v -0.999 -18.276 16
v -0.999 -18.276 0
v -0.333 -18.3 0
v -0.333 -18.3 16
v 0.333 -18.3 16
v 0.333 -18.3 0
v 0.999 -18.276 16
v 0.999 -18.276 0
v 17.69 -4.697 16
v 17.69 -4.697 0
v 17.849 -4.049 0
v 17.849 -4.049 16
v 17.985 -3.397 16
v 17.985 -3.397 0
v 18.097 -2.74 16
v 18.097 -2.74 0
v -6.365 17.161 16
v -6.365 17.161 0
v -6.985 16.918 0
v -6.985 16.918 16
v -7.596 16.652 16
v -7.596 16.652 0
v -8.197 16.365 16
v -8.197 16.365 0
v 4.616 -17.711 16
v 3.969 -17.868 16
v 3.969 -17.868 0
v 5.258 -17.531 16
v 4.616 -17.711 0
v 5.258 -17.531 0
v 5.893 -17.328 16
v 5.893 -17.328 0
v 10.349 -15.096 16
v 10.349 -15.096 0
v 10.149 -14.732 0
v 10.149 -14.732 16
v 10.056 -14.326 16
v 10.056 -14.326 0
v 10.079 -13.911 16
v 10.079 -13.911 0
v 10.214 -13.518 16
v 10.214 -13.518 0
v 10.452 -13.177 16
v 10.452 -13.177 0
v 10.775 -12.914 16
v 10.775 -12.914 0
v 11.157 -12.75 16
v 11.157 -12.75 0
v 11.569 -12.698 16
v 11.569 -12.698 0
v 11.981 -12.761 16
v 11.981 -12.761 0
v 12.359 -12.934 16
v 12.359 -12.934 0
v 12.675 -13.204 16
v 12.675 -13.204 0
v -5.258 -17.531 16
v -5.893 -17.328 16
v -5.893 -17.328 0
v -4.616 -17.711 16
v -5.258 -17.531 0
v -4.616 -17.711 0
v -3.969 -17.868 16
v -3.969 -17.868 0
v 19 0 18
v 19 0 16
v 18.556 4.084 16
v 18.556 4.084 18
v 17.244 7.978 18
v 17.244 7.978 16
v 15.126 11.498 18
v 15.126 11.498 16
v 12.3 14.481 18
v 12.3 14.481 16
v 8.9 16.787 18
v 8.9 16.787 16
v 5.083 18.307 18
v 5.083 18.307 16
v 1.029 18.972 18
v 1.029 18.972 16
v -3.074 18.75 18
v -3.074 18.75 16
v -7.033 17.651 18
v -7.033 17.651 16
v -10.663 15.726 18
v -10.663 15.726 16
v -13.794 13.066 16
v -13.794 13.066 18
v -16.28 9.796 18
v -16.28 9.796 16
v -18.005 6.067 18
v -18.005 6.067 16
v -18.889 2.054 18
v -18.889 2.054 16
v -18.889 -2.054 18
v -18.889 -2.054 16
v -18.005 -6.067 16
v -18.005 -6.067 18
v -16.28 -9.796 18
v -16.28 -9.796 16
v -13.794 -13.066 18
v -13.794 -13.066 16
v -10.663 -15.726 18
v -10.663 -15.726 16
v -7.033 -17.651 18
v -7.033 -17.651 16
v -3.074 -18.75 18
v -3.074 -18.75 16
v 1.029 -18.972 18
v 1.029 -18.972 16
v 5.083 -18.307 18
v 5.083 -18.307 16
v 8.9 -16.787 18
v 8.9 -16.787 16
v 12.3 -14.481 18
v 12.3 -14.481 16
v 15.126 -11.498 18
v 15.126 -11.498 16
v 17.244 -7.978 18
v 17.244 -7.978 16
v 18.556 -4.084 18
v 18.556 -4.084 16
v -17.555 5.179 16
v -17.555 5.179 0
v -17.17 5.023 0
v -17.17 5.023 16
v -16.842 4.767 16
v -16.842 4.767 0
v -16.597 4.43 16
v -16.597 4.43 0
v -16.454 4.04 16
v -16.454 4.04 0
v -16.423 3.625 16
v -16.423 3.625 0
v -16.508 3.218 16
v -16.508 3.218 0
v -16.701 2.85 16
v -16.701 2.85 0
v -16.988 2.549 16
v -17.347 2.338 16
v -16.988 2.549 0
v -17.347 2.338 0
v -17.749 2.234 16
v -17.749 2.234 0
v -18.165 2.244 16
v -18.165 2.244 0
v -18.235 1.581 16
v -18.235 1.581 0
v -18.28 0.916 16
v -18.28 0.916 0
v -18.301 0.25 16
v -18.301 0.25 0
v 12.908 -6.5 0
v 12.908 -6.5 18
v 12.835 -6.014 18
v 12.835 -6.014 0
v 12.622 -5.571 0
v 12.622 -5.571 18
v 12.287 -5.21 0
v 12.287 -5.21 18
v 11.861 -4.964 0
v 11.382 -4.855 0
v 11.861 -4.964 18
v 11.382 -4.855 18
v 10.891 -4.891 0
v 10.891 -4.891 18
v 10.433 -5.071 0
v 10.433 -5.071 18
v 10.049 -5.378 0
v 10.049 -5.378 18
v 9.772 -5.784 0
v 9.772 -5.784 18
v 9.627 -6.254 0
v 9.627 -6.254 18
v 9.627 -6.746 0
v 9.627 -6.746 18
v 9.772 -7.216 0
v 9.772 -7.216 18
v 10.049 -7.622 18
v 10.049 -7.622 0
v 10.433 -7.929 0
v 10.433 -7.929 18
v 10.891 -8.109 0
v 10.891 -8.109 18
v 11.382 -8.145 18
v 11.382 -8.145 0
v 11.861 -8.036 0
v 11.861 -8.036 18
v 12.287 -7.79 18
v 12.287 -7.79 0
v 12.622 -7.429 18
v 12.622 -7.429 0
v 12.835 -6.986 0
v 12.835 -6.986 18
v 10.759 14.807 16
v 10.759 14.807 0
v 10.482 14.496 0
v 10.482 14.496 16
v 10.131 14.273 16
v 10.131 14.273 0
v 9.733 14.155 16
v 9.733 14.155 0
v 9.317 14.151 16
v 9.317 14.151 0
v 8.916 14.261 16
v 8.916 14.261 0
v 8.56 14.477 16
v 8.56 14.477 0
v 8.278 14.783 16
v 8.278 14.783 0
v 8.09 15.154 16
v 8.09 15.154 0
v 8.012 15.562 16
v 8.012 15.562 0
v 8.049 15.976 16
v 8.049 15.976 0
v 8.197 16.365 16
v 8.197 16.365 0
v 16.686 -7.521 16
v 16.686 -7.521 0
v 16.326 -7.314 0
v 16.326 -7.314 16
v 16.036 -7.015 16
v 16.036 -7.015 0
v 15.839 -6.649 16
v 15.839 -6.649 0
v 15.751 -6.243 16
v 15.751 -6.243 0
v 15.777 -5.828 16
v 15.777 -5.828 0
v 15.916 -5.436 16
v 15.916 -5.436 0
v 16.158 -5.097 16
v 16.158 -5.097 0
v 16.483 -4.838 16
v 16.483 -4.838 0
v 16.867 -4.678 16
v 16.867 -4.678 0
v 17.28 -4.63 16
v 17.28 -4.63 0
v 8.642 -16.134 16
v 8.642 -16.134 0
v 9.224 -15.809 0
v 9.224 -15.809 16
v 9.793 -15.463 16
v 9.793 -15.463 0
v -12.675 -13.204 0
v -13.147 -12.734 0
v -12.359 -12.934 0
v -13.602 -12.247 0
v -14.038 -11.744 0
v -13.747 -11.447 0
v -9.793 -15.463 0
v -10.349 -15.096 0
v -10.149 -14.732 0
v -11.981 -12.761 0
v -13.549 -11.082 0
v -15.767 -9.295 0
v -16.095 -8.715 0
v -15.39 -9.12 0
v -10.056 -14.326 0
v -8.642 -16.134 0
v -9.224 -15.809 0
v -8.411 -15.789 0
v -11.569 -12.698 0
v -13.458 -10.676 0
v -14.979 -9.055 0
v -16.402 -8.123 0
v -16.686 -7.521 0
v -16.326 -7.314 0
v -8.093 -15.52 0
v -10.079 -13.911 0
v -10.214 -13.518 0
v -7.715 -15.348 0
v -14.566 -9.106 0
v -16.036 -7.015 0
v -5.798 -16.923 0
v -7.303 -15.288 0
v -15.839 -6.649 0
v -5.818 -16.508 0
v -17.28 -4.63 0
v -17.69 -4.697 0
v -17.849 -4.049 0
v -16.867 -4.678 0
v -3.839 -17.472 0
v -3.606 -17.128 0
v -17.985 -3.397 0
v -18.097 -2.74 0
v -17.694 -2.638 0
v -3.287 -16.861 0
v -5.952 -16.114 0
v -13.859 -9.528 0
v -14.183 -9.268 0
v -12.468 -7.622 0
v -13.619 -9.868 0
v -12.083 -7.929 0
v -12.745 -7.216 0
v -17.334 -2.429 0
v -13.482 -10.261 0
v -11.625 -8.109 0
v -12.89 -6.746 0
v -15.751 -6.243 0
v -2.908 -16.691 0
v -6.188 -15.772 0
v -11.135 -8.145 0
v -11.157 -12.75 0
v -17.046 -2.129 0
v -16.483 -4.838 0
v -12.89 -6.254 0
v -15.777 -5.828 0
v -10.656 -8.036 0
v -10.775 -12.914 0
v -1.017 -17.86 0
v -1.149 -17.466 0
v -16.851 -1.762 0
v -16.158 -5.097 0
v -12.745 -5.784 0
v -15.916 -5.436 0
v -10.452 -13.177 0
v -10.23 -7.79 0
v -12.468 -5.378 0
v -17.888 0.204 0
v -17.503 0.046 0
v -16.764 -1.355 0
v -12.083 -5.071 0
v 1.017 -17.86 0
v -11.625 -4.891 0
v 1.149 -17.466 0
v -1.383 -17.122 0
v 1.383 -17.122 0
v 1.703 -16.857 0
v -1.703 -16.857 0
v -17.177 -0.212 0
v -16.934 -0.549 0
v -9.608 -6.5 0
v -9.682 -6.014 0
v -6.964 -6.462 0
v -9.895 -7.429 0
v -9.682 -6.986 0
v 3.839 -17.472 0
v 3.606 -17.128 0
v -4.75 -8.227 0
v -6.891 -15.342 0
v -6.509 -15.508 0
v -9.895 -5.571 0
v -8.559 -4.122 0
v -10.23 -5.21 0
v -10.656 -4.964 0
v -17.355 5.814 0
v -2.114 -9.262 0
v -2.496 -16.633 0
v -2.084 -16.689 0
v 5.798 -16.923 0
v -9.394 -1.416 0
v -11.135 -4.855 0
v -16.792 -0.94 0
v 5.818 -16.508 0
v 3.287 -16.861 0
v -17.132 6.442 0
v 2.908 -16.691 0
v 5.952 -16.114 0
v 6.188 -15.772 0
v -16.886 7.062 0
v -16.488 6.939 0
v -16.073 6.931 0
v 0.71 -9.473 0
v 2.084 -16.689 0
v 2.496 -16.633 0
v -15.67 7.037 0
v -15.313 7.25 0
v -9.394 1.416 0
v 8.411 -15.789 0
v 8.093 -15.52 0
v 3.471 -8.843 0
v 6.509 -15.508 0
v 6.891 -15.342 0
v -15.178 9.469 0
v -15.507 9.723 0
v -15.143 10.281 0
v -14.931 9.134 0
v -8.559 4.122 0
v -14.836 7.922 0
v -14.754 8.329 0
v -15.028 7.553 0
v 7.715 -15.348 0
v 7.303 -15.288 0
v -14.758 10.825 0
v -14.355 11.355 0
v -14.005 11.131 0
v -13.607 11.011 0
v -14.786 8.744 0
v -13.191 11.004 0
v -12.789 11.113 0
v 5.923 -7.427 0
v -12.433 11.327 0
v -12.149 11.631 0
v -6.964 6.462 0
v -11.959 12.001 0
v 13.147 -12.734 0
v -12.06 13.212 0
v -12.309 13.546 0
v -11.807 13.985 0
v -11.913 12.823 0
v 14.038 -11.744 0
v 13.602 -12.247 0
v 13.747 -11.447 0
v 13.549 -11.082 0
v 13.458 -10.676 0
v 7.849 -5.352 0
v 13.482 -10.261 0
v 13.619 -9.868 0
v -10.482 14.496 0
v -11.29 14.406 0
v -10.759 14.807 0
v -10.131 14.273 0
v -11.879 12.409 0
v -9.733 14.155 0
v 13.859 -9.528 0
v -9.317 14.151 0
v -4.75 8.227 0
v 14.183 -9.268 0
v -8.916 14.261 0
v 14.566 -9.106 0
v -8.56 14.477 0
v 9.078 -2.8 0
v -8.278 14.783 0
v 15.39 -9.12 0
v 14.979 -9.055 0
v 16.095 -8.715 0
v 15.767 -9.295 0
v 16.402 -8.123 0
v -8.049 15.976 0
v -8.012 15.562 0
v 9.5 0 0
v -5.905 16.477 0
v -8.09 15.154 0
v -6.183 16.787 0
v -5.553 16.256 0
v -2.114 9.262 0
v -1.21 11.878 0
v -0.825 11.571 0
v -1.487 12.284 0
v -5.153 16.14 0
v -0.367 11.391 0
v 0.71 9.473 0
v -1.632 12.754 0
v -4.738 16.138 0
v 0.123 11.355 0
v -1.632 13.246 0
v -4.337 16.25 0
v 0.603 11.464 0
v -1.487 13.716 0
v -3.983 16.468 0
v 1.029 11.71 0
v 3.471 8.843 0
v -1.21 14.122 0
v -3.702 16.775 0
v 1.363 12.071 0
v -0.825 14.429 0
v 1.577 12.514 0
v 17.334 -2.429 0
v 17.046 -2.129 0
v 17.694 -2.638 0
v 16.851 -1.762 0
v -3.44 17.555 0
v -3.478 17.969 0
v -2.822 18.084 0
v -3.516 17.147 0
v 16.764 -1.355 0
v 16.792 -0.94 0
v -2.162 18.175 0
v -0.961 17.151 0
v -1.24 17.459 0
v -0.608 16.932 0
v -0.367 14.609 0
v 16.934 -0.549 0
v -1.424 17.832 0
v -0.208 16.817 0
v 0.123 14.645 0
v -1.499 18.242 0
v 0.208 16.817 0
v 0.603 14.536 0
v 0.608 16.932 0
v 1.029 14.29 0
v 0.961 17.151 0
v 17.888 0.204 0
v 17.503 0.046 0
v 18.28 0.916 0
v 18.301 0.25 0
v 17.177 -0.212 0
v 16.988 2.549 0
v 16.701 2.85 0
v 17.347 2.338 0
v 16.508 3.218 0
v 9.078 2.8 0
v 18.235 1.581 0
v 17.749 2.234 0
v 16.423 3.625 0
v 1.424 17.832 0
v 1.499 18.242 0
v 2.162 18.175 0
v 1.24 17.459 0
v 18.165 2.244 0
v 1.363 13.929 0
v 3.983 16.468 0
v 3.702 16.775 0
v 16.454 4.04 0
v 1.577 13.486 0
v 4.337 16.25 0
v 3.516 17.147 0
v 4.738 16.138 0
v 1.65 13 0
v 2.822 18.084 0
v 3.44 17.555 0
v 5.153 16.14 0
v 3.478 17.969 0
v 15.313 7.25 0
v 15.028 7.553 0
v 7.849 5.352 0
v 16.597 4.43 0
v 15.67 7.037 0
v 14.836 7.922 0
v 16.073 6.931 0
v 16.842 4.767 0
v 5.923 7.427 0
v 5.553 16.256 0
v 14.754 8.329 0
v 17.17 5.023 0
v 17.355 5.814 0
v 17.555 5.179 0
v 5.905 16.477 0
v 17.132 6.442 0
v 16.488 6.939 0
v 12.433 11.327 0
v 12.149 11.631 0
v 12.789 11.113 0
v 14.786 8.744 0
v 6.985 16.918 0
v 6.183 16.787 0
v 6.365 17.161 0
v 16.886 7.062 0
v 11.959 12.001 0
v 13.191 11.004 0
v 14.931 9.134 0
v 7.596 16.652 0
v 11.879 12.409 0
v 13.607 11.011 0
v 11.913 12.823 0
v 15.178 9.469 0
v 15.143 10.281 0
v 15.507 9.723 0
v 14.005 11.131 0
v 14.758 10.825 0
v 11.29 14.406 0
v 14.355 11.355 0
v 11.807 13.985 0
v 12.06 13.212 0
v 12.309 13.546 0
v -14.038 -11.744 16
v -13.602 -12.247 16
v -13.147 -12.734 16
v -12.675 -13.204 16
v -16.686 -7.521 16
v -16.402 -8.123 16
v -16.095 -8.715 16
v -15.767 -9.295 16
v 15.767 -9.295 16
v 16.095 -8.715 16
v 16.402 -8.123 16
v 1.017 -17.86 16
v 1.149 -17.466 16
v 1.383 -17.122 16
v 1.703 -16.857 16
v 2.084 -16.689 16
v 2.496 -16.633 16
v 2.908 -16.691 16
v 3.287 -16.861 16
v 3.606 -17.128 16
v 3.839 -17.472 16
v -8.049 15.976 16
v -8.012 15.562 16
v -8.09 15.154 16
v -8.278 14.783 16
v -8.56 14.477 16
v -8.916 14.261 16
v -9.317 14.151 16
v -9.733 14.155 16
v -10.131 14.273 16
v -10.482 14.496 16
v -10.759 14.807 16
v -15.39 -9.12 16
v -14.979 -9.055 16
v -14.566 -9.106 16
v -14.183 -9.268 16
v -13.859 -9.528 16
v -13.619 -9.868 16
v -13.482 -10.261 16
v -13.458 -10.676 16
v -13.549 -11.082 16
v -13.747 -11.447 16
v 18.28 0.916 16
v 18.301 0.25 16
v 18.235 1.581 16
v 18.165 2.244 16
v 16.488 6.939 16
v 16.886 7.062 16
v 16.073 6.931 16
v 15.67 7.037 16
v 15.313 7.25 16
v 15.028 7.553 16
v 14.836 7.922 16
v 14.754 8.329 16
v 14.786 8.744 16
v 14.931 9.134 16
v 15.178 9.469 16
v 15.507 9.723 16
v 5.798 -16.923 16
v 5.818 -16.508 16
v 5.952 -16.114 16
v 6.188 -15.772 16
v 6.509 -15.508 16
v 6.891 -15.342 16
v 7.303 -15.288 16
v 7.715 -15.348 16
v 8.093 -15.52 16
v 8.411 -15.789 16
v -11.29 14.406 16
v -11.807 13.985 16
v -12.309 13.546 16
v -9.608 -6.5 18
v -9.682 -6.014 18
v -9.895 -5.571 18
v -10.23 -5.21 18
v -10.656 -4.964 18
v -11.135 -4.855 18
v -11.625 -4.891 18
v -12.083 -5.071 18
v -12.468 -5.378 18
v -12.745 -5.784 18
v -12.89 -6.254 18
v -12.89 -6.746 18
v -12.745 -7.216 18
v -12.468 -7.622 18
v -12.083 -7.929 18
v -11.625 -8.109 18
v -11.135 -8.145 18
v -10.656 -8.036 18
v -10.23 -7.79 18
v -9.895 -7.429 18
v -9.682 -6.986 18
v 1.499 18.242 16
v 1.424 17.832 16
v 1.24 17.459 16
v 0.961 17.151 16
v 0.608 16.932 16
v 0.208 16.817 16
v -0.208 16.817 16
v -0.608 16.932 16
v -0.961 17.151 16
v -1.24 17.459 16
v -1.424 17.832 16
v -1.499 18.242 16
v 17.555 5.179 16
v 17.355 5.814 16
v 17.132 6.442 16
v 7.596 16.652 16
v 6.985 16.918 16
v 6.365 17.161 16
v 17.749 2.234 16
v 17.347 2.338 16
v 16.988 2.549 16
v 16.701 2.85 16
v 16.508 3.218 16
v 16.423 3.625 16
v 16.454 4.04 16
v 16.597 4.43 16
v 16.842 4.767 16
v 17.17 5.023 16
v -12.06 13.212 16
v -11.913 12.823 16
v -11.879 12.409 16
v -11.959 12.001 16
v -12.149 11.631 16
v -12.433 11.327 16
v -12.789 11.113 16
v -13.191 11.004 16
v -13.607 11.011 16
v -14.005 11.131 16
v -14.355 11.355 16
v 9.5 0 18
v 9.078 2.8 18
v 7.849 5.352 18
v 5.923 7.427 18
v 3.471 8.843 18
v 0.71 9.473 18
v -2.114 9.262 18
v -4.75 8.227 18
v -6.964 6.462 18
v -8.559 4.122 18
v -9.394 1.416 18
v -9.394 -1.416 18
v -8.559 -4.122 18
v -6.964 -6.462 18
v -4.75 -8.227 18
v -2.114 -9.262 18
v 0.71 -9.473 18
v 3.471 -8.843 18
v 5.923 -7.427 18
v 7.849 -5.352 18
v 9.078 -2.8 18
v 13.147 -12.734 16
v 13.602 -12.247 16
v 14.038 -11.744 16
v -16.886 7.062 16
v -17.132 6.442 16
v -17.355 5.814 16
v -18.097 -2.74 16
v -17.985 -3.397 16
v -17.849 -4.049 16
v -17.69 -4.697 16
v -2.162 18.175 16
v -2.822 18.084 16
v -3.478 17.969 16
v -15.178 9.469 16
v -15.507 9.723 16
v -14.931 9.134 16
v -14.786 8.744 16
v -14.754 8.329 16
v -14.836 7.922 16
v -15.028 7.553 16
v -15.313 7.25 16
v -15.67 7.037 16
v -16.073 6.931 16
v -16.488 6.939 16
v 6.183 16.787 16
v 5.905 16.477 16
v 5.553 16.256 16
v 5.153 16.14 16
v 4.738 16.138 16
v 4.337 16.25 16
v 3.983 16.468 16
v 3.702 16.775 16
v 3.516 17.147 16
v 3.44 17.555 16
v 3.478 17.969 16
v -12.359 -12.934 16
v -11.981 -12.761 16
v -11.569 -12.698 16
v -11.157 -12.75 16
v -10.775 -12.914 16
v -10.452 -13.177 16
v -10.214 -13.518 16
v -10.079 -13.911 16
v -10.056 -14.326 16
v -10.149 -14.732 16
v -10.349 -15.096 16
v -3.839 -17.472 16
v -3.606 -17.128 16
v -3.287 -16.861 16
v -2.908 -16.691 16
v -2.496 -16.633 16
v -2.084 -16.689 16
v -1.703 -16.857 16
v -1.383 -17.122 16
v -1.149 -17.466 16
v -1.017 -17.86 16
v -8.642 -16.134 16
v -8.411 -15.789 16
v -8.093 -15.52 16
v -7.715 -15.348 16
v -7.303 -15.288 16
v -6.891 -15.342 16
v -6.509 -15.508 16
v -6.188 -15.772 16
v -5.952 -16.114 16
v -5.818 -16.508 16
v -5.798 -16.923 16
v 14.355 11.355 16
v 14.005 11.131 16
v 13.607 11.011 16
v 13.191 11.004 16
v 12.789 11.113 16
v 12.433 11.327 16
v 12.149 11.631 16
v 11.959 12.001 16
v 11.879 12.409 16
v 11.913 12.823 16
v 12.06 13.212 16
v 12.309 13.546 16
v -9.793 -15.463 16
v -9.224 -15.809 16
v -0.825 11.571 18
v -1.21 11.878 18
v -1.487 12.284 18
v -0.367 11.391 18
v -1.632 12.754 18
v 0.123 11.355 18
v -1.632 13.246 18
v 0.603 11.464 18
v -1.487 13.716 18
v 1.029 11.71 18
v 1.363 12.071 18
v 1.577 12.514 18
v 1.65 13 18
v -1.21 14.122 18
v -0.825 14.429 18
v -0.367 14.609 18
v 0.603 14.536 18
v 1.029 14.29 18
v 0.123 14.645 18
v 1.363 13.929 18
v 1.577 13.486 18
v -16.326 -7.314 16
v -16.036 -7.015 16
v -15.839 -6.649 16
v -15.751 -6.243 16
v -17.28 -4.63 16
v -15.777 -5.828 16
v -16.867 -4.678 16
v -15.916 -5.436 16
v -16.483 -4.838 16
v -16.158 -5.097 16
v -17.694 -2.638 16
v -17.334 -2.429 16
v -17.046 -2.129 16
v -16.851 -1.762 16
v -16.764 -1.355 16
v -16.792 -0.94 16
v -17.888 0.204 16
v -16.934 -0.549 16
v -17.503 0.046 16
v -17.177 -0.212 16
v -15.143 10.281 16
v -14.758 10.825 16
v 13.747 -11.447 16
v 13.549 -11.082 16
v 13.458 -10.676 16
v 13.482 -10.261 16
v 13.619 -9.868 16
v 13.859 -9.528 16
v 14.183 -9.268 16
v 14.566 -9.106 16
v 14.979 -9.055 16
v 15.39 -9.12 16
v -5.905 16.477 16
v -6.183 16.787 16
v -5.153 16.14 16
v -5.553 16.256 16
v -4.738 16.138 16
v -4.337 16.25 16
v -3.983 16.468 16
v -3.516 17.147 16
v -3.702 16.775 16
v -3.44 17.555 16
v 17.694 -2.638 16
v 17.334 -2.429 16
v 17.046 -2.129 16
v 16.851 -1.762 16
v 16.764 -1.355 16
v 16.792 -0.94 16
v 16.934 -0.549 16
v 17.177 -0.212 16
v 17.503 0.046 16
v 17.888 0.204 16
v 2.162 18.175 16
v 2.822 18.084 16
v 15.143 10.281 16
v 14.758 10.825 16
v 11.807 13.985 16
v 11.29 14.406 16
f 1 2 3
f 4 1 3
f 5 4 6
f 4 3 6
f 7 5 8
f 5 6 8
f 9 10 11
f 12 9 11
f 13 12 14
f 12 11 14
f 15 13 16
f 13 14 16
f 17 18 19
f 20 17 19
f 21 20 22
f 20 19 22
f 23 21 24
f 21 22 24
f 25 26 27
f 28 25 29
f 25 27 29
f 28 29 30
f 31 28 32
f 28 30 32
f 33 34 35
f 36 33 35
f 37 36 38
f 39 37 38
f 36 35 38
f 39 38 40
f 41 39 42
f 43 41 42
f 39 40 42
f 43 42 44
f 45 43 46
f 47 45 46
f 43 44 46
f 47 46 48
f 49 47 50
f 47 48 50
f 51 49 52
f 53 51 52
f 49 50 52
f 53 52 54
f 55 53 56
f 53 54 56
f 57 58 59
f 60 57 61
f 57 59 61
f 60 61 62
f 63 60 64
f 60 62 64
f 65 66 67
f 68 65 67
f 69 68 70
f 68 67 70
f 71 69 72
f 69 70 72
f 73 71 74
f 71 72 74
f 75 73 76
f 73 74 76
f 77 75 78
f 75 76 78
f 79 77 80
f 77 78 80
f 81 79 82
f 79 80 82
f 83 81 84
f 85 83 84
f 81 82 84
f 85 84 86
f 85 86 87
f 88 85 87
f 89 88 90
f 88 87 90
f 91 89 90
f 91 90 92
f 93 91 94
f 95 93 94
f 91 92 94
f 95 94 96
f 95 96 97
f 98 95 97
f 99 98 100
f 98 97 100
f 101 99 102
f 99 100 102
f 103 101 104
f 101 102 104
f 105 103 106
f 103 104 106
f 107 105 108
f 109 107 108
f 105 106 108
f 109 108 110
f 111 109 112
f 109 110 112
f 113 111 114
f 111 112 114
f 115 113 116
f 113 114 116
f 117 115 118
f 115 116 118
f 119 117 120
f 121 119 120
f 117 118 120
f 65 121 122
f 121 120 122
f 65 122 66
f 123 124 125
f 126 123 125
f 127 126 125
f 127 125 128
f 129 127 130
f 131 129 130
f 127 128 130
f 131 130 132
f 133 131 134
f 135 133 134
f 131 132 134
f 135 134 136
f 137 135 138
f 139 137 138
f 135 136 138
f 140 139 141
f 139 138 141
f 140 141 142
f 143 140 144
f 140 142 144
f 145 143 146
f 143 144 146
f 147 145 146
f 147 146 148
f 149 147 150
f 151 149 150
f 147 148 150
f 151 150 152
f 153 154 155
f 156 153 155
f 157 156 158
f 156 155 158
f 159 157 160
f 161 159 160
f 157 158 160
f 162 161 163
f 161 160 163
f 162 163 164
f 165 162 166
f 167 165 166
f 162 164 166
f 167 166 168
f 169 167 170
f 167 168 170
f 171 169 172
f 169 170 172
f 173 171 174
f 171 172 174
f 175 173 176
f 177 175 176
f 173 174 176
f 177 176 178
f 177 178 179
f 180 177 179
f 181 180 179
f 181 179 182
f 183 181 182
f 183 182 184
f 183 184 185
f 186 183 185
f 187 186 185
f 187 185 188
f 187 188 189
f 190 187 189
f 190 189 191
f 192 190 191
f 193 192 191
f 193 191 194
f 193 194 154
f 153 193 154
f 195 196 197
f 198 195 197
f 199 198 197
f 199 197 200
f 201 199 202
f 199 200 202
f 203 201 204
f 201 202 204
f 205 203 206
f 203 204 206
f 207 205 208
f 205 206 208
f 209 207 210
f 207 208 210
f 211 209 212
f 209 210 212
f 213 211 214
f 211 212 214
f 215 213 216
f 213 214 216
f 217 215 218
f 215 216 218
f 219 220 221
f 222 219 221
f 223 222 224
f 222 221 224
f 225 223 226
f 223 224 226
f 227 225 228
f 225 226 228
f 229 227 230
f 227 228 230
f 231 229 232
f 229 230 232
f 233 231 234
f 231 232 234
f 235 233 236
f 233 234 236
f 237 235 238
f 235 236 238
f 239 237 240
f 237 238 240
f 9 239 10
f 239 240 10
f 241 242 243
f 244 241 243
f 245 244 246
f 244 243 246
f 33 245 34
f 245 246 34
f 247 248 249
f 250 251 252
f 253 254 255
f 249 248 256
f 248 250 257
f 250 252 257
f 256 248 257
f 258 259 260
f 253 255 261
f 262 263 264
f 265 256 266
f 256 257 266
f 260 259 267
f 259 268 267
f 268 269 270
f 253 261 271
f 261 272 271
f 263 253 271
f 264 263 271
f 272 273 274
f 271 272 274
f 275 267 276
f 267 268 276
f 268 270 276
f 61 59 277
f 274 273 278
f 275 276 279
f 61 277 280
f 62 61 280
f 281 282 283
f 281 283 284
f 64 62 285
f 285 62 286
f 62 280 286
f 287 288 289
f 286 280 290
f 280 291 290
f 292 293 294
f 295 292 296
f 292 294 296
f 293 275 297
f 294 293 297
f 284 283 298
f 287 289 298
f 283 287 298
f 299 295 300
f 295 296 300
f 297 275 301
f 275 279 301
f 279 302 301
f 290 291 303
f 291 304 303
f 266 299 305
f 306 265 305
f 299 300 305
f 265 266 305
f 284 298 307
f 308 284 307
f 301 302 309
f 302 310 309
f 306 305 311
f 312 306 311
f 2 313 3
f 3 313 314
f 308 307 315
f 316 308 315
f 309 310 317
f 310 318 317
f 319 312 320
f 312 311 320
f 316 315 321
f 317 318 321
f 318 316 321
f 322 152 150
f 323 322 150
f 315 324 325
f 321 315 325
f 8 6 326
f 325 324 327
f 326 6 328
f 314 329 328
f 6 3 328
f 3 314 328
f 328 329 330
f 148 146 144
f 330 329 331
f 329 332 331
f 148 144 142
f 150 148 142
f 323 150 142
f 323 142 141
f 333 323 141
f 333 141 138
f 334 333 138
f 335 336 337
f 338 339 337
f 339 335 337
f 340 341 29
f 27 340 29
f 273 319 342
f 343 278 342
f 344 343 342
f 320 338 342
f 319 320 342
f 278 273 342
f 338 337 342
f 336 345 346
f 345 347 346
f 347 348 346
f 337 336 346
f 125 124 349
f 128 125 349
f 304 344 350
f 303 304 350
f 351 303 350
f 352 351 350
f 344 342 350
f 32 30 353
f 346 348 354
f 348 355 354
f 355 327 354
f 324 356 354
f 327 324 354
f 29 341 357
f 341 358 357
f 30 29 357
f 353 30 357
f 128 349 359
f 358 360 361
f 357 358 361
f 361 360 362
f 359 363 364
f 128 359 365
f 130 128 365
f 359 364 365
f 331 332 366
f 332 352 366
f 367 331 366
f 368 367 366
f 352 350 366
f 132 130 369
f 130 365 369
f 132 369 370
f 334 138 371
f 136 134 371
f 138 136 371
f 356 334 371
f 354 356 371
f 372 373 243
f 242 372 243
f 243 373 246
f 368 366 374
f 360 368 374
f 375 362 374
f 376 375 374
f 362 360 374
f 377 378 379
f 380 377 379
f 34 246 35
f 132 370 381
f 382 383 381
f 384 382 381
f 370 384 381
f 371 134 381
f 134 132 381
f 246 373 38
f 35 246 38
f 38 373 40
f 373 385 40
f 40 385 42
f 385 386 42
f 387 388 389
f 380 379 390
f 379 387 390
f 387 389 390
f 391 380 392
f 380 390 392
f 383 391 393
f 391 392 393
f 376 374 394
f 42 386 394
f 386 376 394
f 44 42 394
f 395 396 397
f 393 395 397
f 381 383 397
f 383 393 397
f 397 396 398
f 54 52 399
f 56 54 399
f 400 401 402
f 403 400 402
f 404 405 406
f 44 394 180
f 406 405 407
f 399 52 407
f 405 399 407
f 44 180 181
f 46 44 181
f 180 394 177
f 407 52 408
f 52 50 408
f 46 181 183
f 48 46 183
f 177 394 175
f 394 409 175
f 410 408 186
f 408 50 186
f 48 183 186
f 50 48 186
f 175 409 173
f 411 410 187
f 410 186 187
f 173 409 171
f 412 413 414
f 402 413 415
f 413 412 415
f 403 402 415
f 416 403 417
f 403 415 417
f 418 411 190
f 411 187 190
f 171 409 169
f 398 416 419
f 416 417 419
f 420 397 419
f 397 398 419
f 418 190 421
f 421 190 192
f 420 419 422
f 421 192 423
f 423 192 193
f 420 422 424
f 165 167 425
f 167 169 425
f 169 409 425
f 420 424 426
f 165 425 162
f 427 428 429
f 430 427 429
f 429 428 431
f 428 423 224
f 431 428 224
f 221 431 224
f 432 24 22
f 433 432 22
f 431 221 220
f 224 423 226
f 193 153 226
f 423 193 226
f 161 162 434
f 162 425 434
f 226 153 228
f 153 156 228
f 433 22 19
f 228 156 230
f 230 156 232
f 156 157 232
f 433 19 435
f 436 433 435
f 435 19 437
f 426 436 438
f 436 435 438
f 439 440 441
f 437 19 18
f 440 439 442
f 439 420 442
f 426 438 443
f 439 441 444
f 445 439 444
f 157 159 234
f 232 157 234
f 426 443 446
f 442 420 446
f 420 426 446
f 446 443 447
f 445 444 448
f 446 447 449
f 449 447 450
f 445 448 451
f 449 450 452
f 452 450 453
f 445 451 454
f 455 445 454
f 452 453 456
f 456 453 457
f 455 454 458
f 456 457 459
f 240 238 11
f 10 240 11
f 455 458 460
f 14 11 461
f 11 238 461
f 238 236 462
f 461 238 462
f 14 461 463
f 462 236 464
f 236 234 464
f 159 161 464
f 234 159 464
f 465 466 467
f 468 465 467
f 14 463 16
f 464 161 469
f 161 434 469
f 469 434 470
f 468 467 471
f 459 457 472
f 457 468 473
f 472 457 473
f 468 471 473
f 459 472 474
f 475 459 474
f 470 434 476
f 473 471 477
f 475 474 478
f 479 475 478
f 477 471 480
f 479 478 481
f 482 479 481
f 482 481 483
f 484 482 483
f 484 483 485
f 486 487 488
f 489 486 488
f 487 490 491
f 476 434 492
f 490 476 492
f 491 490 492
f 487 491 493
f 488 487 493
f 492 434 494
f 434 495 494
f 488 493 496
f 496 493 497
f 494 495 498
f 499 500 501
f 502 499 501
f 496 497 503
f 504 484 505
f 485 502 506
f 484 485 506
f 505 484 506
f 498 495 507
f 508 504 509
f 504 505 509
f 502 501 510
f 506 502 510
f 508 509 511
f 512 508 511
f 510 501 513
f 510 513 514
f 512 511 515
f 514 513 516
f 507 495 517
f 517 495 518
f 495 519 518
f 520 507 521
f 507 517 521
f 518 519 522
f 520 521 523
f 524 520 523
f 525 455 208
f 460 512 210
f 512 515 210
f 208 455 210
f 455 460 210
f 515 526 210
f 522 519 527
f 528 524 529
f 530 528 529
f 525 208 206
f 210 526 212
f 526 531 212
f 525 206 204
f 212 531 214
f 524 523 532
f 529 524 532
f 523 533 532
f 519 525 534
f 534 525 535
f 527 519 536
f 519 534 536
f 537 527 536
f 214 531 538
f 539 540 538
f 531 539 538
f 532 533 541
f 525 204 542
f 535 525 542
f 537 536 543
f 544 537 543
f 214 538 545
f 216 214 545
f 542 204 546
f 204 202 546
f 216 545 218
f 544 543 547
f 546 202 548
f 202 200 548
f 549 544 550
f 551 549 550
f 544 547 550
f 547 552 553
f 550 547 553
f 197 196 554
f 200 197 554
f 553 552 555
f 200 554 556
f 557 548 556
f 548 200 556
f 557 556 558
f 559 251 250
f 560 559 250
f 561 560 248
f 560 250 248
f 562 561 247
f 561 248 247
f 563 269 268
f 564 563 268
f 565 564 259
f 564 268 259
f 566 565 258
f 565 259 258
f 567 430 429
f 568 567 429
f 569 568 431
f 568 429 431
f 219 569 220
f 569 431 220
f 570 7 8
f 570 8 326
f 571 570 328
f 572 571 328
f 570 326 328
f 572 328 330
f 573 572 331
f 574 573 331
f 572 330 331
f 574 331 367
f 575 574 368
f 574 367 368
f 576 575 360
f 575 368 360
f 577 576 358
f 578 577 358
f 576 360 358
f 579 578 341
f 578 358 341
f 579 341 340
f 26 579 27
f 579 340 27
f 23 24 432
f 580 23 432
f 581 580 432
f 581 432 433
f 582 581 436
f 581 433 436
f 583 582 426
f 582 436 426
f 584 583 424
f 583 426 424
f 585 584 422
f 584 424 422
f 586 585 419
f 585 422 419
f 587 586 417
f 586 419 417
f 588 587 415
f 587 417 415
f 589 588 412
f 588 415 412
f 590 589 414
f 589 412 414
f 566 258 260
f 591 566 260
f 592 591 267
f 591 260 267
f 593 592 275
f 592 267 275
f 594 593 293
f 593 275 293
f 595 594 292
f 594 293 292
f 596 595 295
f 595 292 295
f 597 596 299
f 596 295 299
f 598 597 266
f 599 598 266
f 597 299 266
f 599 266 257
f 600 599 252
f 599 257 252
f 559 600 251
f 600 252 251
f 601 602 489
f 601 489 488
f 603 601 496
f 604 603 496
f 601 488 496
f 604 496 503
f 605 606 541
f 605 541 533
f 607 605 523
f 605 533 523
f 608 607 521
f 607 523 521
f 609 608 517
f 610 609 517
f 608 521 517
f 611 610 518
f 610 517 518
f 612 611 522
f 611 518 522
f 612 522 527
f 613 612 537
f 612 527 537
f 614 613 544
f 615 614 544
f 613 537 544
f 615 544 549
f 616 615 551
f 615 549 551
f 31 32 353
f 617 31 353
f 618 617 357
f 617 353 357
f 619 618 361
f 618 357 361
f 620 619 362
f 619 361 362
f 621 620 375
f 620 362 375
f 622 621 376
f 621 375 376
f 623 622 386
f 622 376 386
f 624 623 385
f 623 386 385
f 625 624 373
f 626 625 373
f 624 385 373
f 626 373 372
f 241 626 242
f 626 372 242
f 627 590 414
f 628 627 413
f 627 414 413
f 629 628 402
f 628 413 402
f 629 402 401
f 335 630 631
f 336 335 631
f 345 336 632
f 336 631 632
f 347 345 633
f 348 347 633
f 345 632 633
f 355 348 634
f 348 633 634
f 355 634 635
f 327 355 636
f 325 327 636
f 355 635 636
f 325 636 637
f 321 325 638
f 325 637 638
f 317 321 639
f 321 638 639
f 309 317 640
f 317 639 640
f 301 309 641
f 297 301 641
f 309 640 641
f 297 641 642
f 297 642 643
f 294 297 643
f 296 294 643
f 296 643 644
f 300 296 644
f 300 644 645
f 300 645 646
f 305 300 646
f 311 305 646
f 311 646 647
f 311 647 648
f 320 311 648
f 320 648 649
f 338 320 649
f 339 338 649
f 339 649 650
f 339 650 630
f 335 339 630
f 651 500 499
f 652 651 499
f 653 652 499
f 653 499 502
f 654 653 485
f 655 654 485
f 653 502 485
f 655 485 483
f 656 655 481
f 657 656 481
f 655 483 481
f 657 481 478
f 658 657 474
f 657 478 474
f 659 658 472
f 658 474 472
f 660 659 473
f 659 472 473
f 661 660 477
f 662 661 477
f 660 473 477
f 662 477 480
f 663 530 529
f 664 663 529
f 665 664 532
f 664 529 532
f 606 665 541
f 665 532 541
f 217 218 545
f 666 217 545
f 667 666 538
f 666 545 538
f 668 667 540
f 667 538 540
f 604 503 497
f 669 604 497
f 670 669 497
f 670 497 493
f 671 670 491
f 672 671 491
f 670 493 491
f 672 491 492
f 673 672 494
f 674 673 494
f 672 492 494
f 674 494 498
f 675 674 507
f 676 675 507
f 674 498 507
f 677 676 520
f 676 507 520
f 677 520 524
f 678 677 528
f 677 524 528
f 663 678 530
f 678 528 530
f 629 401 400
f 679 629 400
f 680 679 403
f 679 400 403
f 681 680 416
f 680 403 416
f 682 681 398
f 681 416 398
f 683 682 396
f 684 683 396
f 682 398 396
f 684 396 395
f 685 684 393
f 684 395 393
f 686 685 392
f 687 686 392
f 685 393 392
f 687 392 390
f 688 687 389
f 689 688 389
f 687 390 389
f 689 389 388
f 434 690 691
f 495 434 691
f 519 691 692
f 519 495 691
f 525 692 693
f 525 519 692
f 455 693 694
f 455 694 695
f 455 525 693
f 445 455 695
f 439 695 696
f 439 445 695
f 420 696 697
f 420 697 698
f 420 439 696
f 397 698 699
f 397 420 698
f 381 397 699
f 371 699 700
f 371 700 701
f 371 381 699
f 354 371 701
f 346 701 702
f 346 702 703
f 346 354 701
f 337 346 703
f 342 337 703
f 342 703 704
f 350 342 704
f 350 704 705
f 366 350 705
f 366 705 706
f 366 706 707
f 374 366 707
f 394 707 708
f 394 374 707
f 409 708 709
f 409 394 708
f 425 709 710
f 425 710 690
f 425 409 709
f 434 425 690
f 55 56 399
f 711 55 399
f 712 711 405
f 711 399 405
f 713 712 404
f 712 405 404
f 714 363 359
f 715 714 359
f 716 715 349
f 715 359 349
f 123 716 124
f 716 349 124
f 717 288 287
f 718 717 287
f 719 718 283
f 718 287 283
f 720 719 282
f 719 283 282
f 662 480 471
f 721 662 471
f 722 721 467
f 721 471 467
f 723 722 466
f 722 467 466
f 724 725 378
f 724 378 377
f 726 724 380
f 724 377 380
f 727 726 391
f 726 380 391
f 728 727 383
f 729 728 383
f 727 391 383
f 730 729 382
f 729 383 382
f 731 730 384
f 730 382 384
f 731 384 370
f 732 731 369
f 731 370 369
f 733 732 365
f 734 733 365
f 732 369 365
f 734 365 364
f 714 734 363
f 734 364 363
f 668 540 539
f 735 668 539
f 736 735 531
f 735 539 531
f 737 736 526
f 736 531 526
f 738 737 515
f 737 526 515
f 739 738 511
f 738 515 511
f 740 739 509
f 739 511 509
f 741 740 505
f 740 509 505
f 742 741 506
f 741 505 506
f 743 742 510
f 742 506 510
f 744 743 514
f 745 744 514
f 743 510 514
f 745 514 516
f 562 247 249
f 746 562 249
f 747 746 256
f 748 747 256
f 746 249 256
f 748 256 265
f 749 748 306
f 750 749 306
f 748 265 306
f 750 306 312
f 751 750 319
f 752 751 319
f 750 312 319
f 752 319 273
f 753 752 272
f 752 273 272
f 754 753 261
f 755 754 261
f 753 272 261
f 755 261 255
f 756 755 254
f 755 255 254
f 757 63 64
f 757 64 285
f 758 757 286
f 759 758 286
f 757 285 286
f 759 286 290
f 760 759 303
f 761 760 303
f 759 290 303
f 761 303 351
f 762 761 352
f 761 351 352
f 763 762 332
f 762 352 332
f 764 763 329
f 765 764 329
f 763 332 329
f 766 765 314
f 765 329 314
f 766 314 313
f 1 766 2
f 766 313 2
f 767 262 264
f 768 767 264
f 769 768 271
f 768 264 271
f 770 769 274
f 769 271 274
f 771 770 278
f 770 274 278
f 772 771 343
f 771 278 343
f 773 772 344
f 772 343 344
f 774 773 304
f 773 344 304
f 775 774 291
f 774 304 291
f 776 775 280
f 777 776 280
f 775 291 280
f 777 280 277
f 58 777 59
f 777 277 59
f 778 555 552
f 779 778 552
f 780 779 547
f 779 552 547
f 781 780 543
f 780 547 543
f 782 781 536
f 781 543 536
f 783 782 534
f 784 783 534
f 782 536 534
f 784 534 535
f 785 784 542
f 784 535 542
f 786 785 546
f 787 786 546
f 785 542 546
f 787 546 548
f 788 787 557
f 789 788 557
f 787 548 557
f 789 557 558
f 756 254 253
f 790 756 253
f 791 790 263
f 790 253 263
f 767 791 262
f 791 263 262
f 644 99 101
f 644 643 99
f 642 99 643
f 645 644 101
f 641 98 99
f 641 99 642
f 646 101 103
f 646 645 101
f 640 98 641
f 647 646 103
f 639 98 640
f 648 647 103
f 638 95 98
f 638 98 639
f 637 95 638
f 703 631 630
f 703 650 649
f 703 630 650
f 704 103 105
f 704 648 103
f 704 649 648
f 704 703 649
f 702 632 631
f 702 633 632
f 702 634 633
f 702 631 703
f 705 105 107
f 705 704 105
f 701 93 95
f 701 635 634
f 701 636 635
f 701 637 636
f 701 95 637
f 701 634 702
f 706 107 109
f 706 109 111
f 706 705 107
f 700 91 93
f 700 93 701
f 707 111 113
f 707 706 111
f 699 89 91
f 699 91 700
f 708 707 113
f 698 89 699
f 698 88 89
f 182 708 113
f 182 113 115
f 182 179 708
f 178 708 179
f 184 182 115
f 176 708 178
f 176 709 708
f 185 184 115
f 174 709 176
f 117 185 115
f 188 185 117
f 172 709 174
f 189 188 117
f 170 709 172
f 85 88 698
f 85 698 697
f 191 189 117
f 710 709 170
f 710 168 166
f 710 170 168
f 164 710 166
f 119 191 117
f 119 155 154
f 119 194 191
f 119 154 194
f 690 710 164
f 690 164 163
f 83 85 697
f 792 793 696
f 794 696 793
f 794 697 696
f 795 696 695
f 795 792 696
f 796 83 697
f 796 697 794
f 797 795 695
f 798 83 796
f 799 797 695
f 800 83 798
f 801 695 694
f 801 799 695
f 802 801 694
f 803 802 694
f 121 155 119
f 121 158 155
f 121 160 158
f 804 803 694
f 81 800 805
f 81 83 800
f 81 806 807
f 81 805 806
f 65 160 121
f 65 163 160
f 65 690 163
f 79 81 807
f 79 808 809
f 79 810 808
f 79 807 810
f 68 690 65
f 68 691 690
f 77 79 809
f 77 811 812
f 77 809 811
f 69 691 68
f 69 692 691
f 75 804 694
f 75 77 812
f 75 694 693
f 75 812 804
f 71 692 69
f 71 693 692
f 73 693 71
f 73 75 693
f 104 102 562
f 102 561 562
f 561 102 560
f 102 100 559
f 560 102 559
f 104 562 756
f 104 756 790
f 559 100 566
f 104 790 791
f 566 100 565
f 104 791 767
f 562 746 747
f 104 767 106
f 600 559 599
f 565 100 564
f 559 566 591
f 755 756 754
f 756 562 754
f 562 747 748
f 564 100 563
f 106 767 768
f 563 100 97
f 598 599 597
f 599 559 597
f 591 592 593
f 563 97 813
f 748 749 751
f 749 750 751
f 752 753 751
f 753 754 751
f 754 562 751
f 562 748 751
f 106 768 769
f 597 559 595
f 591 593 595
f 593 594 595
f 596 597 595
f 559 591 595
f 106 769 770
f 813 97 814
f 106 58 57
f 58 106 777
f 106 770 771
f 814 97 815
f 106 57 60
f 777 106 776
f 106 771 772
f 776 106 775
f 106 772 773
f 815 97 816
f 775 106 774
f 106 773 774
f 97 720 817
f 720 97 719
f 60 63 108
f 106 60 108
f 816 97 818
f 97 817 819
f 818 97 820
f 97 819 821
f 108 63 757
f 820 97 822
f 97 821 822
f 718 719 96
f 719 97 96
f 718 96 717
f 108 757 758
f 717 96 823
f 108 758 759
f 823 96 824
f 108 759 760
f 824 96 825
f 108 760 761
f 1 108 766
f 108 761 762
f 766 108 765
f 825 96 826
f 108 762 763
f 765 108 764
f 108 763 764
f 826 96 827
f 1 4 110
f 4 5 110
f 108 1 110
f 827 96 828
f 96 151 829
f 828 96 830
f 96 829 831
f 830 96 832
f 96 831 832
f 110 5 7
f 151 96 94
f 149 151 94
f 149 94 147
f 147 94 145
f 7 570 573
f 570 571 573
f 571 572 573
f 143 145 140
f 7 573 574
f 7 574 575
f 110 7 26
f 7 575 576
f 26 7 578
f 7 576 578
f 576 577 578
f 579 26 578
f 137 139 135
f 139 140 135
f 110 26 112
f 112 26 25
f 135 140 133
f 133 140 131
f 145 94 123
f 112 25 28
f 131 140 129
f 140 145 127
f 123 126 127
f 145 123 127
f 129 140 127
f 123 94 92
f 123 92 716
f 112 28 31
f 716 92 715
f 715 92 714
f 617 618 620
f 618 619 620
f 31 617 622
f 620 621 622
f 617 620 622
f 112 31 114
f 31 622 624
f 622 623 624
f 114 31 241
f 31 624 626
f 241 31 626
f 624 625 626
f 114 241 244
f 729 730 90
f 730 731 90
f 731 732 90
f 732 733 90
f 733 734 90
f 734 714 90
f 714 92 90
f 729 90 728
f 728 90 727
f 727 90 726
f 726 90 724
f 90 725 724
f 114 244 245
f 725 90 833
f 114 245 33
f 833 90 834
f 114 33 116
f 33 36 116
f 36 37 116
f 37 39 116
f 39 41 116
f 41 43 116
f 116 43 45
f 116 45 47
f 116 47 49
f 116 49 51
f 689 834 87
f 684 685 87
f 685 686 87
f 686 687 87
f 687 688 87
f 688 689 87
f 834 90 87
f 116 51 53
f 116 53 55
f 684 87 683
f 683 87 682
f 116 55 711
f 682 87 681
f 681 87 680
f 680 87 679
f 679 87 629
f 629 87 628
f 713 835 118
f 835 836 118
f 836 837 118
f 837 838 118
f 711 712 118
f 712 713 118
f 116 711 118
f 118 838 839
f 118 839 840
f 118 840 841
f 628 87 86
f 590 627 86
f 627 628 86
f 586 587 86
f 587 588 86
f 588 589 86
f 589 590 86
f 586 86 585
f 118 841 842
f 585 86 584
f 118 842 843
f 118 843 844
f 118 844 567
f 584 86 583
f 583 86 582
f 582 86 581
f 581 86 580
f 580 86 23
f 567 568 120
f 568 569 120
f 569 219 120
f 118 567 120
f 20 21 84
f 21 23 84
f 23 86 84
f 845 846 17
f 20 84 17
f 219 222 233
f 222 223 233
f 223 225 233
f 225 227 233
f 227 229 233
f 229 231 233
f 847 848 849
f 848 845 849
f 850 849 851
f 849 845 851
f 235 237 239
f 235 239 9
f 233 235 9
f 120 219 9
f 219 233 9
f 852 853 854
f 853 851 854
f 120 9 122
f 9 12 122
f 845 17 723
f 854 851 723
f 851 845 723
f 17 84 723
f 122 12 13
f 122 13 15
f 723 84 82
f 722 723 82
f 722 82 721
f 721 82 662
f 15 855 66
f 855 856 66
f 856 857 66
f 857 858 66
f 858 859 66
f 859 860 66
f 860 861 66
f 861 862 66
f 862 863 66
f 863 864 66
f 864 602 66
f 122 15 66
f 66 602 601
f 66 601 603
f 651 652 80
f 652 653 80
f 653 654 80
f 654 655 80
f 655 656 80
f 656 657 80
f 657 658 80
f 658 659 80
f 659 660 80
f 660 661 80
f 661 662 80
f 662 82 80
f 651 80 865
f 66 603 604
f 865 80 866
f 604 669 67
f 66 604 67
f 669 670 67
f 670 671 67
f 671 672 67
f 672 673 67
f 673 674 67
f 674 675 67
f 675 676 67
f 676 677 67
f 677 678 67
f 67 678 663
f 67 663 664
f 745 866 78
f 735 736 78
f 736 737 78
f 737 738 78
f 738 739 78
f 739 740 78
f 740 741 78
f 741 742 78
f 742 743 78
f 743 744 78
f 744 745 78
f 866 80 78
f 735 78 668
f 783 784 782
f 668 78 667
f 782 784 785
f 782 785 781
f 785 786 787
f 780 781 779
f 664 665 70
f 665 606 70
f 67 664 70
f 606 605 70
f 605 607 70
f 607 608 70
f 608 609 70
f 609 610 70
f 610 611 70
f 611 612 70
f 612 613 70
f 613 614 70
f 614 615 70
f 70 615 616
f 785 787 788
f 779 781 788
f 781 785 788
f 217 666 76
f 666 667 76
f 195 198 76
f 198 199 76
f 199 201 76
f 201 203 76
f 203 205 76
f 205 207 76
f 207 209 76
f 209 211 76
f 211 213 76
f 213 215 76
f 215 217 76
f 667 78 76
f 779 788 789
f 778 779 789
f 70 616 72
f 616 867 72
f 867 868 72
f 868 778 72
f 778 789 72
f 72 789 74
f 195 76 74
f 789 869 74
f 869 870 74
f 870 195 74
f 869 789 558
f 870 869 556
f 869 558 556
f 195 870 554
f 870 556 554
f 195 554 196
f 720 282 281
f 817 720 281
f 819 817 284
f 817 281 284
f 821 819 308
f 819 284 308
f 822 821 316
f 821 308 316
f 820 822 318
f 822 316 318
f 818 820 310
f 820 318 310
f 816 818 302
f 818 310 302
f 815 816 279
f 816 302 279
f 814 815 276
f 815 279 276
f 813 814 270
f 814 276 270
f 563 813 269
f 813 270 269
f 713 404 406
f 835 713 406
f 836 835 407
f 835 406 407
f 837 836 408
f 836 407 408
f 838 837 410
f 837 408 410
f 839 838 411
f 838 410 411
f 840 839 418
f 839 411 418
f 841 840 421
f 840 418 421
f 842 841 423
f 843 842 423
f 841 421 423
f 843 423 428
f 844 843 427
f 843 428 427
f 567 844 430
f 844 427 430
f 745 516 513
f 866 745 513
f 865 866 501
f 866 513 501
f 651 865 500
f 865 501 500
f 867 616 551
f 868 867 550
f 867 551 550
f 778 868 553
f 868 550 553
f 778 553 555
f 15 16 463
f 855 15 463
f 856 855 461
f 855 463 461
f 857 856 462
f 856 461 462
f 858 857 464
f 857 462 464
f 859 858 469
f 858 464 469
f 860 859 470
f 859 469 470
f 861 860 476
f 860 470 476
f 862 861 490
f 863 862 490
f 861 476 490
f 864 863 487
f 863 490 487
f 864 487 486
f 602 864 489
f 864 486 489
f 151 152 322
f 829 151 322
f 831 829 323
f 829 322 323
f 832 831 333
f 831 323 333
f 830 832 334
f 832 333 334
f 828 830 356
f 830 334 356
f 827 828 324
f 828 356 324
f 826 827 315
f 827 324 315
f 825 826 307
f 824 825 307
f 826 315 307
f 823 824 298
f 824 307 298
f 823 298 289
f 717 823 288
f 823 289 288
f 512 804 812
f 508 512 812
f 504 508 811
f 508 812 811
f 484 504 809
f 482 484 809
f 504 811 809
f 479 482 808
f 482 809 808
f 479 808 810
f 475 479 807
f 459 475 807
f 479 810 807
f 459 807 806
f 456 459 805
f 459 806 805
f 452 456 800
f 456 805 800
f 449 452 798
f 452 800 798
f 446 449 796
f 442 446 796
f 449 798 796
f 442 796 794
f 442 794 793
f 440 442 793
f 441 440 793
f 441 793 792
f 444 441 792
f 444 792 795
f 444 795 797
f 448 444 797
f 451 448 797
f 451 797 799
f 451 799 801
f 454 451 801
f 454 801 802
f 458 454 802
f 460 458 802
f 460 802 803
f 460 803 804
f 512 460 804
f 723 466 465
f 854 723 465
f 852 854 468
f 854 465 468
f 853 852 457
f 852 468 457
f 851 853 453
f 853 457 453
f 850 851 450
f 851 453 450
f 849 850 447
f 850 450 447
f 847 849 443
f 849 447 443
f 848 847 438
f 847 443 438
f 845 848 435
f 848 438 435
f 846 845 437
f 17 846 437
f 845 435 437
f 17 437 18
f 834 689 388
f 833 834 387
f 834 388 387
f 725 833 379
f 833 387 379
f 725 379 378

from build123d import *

# Parameters (mm, degrees)
SKETCH_1_R          = 9.5
EXTRUDE_1_DEPTH     = 16
SKETCH_2_R          = 19
SKETCH_2_R_2        = 9.5
EXTRUDE_2_DEPTH     = 2
SKETCH_4_R          = 1.65
CUT_EXTRUDE_1_DEPTH = 19


with BuildPart() as part:
    # Эскиз1 → Бобышка-Вытянуть1 (new body)
    with BuildSketch(Plane.XY):
        with BuildLine():
            ThreePointArc((-1.498740142, 18.241534666), (-2.492258178, 18.13252487), (-3.478344362, 17.969444329))
            ThreePointArc((-3.478344362, 17.969444329), (-4.533395146, 16.179899179), (-6.364669946, 17.160733827))
            ThreePointArc((-6.364669946, 17.160733827), (-7.291935147, 16.787718451), (-8.197455977, 16.364642511))
            ThreePointArc((-8.197455977, 16.364642511), (-8.730569112, 14.356809255), (-10.758561296, 14.807199865))
            ThreePointArc((-10.758561296, 14.807199865), (-11.550802645, 14.197843754), (-12.308599783, 13.54615002))
            ThreePointArc((-12.308599783, 13.54615002), (-12.280236708, 11.468940466), (-14.354539373, 11.355483627))
            ThreePointArc((-14.354539373, 11.355483627), (-14.952999952, 10.554979936), (-15.506871051, 9.723001553))
            ThreePointArc((-15.506871051, 9.723001553), (-14.919135325, 7.730472829), (-16.885906931, 7.061583116))
            ThreePointArc((-16.885906931, 7.061583116), (-17.246201658, 6.129301542), (-17.555068633, 5.17874254))
            ThreePointArc((-17.555068633, 5.17874254), (-16.451549925, 3.418671387), (-18.164924021, 2.243957291))
            ThreePointArc((-18.164924021, 2.243957291), (-18.260331482, 1.249040892), (-18.301287083, 0.250399884))
            ThreePointArc((-18.301287083, 0.250399884), (-16.763828329, -1.146677272), (-18.096731795, -2.740092582))
            ThreePointArc((-18.096731795, -2.740092582), (-17.920176057, -3.723855407), (-17.690182793, -4.696513786))
            ThreePointArc((-17.690182793, -4.696513786), (-15.832810274, -5.626982123), (-16.686387758, -7.520922323))
            ThreePointArc((-16.686387758, -7.520922323), (-16.250963152, -8.420570386), (-15.767078573, -9.295108514))
            ThreePointArc((-15.767078573, -9.295108514), (-13.727545112, -9.689959452), (-14.038490677, -11.743959661))
            ThreePointArc((-14.038490677, -11.743959661), (-13.376490654, -12.49277018), (-12.674602264, -13.204327565))
            ThreePointArc((-12.674602264, -13.204327565), (-10.604170729, -13.034276818), (-10.349422964, -15.096001236))
            ThreePointArc((-10.349422964, -15.096001236), (-9.509945037, -15.638438361), (-8.642108688, -16.134242047))
            ThreePointArc((-8.642108688, -16.134242047), (-6.694333513, -15.411901499), (-5.892785895, -17.328441459))
            ThreePointArc((-5.892785895, -17.328441459), (-4.938090302, -17.62427511), (-3.968669445, -17.867553605))
            ThreePointArc((-3.968669445, -17.867553605), (-2.288008205, -16.646495951), (-0.999107855, -18.275710451))
            ThreePointArc((-0.999107855, -18.275710451), (0, -18.303), (0.999107855, -18.275710451))
            ThreePointArc((0.999107855, -18.275710451), (2.288008205, -16.646495951), (3.968669445, -17.867553605))
            ThreePointArc((3.968669445, -17.867553605), (4.938090302, -17.62427511), (5.892785895, -17.328441459))
            ThreePointArc((5.892785895, -17.328441459), (6.694333513, -15.411901499), (8.642108688, -16.134242047))
            ThreePointArc((8.642108688, -16.134242047), (9.509945037, -15.638438361), (10.349422964, -15.096001236))
            ThreePointArc((10.349422964, -15.096001236), (10.604170729, -13.034276818), (12.674602264, -13.204327565))
            ThreePointArc((12.674602264, -13.204327565), (13.376490654, -12.49277018), (14.038490677, -11.743959661))
            ThreePointArc((14.038490677, -11.743959661), (13.727545112, -9.689959452), (15.767078573, -9.295108514))
            ThreePointArc((15.767078573, -9.295108514), (16.250963152, -8.420570386), (16.686387758, -7.520922323))
            ThreePointArc((16.686387758, -7.520922323), (15.832810274, -5.626982123), (17.690182793, -4.696513786))
            ThreePointArc((17.690182793, -4.696513786), (17.920176057, -3.723855407), (18.096731795, -2.740092582))
            ThreePointArc((18.096731795, -2.740092582), (16.763828329, -1.146677272), (18.301287083, 0.250399884))
            ThreePointArc((18.301287083, 0.250399884), (18.260331482, 1.249040892), (18.164924021, 2.243957291))
            ThreePointArc((18.164924021, 2.243957291), (16.451549925, 3.418671387), (17.555068633, 5.17874254))
            ThreePointArc((17.555068633, 5.17874254), (17.246201658, 6.129301542), (16.885906931, 7.061583116))
            ThreePointArc((16.885906931, 7.061583116), (14.919135325, 7.730472829), (15.506871051, 9.723001553))
            ThreePointArc((15.506871051, 9.723001553), (14.952999952, 10.554979936), (14.354539373, 11.355483627))
            ThreePointArc((14.354539373, 11.355483627), (12.280236708, 11.468940466), (12.308599783, 13.54615002))
            ThreePointArc((12.308599783, 13.54615002), (11.550802645, 14.197843754), (10.758561296, 14.807199865))
            ThreePointArc((10.758561296, 14.807199865), (8.730569112, 14.356809255), (8.197455977, 16.364642511))
            ThreePointArc((8.197455977, 16.364642511), (7.291935147, 16.787718451), (6.364669946, 17.160733827))
            ThreePointArc((6.364669946, 17.160733827), (4.533395146, 16.179899179), (3.478344362, 17.969444329))
            ThreePointArc((3.478344362, 17.969444329), (2.492258178, 18.13252487), (1.498740142, 18.241534666))
            ThreePointArc((1.498740142, 18.241534666), (0, 16.803), (-1.498740142, 18.241534666))
        make_face()
        Circle(SKETCH_1_R, mode=Mode.SUBTRACT)
    extrude(amount=EXTRUDE_1_DEPTH)

    # Эскиз2 → Бобышка-Вытянуть2 (add)
    with BuildSketch(Plane.XY.offset(16)):
        Circle(SKETCH_2_R)
        Circle(SKETCH_2_R_2, mode=Mode.SUBTRACT)
    extrude(amount=EXTRUDE_2_DEPTH)

    # Эскиз4 → Вырез-Вытянуть1 (cut, through all)
    with BuildSketch(Plane.XY.offset(18)):
        with Locations((0, 13)):
            Circle(SKETCH_4_R)
        with Locations((11.258330249, -6.5)):
            Circle(SKETCH_4_R)
        with Locations((-11.258330249, -6.5)):
            Circle(SKETCH_4_R)
    extrude(amount=-CUT_EXTRUDE_1_DEPTH, mode=Mode.SUBTRACT)


solid = part.part
